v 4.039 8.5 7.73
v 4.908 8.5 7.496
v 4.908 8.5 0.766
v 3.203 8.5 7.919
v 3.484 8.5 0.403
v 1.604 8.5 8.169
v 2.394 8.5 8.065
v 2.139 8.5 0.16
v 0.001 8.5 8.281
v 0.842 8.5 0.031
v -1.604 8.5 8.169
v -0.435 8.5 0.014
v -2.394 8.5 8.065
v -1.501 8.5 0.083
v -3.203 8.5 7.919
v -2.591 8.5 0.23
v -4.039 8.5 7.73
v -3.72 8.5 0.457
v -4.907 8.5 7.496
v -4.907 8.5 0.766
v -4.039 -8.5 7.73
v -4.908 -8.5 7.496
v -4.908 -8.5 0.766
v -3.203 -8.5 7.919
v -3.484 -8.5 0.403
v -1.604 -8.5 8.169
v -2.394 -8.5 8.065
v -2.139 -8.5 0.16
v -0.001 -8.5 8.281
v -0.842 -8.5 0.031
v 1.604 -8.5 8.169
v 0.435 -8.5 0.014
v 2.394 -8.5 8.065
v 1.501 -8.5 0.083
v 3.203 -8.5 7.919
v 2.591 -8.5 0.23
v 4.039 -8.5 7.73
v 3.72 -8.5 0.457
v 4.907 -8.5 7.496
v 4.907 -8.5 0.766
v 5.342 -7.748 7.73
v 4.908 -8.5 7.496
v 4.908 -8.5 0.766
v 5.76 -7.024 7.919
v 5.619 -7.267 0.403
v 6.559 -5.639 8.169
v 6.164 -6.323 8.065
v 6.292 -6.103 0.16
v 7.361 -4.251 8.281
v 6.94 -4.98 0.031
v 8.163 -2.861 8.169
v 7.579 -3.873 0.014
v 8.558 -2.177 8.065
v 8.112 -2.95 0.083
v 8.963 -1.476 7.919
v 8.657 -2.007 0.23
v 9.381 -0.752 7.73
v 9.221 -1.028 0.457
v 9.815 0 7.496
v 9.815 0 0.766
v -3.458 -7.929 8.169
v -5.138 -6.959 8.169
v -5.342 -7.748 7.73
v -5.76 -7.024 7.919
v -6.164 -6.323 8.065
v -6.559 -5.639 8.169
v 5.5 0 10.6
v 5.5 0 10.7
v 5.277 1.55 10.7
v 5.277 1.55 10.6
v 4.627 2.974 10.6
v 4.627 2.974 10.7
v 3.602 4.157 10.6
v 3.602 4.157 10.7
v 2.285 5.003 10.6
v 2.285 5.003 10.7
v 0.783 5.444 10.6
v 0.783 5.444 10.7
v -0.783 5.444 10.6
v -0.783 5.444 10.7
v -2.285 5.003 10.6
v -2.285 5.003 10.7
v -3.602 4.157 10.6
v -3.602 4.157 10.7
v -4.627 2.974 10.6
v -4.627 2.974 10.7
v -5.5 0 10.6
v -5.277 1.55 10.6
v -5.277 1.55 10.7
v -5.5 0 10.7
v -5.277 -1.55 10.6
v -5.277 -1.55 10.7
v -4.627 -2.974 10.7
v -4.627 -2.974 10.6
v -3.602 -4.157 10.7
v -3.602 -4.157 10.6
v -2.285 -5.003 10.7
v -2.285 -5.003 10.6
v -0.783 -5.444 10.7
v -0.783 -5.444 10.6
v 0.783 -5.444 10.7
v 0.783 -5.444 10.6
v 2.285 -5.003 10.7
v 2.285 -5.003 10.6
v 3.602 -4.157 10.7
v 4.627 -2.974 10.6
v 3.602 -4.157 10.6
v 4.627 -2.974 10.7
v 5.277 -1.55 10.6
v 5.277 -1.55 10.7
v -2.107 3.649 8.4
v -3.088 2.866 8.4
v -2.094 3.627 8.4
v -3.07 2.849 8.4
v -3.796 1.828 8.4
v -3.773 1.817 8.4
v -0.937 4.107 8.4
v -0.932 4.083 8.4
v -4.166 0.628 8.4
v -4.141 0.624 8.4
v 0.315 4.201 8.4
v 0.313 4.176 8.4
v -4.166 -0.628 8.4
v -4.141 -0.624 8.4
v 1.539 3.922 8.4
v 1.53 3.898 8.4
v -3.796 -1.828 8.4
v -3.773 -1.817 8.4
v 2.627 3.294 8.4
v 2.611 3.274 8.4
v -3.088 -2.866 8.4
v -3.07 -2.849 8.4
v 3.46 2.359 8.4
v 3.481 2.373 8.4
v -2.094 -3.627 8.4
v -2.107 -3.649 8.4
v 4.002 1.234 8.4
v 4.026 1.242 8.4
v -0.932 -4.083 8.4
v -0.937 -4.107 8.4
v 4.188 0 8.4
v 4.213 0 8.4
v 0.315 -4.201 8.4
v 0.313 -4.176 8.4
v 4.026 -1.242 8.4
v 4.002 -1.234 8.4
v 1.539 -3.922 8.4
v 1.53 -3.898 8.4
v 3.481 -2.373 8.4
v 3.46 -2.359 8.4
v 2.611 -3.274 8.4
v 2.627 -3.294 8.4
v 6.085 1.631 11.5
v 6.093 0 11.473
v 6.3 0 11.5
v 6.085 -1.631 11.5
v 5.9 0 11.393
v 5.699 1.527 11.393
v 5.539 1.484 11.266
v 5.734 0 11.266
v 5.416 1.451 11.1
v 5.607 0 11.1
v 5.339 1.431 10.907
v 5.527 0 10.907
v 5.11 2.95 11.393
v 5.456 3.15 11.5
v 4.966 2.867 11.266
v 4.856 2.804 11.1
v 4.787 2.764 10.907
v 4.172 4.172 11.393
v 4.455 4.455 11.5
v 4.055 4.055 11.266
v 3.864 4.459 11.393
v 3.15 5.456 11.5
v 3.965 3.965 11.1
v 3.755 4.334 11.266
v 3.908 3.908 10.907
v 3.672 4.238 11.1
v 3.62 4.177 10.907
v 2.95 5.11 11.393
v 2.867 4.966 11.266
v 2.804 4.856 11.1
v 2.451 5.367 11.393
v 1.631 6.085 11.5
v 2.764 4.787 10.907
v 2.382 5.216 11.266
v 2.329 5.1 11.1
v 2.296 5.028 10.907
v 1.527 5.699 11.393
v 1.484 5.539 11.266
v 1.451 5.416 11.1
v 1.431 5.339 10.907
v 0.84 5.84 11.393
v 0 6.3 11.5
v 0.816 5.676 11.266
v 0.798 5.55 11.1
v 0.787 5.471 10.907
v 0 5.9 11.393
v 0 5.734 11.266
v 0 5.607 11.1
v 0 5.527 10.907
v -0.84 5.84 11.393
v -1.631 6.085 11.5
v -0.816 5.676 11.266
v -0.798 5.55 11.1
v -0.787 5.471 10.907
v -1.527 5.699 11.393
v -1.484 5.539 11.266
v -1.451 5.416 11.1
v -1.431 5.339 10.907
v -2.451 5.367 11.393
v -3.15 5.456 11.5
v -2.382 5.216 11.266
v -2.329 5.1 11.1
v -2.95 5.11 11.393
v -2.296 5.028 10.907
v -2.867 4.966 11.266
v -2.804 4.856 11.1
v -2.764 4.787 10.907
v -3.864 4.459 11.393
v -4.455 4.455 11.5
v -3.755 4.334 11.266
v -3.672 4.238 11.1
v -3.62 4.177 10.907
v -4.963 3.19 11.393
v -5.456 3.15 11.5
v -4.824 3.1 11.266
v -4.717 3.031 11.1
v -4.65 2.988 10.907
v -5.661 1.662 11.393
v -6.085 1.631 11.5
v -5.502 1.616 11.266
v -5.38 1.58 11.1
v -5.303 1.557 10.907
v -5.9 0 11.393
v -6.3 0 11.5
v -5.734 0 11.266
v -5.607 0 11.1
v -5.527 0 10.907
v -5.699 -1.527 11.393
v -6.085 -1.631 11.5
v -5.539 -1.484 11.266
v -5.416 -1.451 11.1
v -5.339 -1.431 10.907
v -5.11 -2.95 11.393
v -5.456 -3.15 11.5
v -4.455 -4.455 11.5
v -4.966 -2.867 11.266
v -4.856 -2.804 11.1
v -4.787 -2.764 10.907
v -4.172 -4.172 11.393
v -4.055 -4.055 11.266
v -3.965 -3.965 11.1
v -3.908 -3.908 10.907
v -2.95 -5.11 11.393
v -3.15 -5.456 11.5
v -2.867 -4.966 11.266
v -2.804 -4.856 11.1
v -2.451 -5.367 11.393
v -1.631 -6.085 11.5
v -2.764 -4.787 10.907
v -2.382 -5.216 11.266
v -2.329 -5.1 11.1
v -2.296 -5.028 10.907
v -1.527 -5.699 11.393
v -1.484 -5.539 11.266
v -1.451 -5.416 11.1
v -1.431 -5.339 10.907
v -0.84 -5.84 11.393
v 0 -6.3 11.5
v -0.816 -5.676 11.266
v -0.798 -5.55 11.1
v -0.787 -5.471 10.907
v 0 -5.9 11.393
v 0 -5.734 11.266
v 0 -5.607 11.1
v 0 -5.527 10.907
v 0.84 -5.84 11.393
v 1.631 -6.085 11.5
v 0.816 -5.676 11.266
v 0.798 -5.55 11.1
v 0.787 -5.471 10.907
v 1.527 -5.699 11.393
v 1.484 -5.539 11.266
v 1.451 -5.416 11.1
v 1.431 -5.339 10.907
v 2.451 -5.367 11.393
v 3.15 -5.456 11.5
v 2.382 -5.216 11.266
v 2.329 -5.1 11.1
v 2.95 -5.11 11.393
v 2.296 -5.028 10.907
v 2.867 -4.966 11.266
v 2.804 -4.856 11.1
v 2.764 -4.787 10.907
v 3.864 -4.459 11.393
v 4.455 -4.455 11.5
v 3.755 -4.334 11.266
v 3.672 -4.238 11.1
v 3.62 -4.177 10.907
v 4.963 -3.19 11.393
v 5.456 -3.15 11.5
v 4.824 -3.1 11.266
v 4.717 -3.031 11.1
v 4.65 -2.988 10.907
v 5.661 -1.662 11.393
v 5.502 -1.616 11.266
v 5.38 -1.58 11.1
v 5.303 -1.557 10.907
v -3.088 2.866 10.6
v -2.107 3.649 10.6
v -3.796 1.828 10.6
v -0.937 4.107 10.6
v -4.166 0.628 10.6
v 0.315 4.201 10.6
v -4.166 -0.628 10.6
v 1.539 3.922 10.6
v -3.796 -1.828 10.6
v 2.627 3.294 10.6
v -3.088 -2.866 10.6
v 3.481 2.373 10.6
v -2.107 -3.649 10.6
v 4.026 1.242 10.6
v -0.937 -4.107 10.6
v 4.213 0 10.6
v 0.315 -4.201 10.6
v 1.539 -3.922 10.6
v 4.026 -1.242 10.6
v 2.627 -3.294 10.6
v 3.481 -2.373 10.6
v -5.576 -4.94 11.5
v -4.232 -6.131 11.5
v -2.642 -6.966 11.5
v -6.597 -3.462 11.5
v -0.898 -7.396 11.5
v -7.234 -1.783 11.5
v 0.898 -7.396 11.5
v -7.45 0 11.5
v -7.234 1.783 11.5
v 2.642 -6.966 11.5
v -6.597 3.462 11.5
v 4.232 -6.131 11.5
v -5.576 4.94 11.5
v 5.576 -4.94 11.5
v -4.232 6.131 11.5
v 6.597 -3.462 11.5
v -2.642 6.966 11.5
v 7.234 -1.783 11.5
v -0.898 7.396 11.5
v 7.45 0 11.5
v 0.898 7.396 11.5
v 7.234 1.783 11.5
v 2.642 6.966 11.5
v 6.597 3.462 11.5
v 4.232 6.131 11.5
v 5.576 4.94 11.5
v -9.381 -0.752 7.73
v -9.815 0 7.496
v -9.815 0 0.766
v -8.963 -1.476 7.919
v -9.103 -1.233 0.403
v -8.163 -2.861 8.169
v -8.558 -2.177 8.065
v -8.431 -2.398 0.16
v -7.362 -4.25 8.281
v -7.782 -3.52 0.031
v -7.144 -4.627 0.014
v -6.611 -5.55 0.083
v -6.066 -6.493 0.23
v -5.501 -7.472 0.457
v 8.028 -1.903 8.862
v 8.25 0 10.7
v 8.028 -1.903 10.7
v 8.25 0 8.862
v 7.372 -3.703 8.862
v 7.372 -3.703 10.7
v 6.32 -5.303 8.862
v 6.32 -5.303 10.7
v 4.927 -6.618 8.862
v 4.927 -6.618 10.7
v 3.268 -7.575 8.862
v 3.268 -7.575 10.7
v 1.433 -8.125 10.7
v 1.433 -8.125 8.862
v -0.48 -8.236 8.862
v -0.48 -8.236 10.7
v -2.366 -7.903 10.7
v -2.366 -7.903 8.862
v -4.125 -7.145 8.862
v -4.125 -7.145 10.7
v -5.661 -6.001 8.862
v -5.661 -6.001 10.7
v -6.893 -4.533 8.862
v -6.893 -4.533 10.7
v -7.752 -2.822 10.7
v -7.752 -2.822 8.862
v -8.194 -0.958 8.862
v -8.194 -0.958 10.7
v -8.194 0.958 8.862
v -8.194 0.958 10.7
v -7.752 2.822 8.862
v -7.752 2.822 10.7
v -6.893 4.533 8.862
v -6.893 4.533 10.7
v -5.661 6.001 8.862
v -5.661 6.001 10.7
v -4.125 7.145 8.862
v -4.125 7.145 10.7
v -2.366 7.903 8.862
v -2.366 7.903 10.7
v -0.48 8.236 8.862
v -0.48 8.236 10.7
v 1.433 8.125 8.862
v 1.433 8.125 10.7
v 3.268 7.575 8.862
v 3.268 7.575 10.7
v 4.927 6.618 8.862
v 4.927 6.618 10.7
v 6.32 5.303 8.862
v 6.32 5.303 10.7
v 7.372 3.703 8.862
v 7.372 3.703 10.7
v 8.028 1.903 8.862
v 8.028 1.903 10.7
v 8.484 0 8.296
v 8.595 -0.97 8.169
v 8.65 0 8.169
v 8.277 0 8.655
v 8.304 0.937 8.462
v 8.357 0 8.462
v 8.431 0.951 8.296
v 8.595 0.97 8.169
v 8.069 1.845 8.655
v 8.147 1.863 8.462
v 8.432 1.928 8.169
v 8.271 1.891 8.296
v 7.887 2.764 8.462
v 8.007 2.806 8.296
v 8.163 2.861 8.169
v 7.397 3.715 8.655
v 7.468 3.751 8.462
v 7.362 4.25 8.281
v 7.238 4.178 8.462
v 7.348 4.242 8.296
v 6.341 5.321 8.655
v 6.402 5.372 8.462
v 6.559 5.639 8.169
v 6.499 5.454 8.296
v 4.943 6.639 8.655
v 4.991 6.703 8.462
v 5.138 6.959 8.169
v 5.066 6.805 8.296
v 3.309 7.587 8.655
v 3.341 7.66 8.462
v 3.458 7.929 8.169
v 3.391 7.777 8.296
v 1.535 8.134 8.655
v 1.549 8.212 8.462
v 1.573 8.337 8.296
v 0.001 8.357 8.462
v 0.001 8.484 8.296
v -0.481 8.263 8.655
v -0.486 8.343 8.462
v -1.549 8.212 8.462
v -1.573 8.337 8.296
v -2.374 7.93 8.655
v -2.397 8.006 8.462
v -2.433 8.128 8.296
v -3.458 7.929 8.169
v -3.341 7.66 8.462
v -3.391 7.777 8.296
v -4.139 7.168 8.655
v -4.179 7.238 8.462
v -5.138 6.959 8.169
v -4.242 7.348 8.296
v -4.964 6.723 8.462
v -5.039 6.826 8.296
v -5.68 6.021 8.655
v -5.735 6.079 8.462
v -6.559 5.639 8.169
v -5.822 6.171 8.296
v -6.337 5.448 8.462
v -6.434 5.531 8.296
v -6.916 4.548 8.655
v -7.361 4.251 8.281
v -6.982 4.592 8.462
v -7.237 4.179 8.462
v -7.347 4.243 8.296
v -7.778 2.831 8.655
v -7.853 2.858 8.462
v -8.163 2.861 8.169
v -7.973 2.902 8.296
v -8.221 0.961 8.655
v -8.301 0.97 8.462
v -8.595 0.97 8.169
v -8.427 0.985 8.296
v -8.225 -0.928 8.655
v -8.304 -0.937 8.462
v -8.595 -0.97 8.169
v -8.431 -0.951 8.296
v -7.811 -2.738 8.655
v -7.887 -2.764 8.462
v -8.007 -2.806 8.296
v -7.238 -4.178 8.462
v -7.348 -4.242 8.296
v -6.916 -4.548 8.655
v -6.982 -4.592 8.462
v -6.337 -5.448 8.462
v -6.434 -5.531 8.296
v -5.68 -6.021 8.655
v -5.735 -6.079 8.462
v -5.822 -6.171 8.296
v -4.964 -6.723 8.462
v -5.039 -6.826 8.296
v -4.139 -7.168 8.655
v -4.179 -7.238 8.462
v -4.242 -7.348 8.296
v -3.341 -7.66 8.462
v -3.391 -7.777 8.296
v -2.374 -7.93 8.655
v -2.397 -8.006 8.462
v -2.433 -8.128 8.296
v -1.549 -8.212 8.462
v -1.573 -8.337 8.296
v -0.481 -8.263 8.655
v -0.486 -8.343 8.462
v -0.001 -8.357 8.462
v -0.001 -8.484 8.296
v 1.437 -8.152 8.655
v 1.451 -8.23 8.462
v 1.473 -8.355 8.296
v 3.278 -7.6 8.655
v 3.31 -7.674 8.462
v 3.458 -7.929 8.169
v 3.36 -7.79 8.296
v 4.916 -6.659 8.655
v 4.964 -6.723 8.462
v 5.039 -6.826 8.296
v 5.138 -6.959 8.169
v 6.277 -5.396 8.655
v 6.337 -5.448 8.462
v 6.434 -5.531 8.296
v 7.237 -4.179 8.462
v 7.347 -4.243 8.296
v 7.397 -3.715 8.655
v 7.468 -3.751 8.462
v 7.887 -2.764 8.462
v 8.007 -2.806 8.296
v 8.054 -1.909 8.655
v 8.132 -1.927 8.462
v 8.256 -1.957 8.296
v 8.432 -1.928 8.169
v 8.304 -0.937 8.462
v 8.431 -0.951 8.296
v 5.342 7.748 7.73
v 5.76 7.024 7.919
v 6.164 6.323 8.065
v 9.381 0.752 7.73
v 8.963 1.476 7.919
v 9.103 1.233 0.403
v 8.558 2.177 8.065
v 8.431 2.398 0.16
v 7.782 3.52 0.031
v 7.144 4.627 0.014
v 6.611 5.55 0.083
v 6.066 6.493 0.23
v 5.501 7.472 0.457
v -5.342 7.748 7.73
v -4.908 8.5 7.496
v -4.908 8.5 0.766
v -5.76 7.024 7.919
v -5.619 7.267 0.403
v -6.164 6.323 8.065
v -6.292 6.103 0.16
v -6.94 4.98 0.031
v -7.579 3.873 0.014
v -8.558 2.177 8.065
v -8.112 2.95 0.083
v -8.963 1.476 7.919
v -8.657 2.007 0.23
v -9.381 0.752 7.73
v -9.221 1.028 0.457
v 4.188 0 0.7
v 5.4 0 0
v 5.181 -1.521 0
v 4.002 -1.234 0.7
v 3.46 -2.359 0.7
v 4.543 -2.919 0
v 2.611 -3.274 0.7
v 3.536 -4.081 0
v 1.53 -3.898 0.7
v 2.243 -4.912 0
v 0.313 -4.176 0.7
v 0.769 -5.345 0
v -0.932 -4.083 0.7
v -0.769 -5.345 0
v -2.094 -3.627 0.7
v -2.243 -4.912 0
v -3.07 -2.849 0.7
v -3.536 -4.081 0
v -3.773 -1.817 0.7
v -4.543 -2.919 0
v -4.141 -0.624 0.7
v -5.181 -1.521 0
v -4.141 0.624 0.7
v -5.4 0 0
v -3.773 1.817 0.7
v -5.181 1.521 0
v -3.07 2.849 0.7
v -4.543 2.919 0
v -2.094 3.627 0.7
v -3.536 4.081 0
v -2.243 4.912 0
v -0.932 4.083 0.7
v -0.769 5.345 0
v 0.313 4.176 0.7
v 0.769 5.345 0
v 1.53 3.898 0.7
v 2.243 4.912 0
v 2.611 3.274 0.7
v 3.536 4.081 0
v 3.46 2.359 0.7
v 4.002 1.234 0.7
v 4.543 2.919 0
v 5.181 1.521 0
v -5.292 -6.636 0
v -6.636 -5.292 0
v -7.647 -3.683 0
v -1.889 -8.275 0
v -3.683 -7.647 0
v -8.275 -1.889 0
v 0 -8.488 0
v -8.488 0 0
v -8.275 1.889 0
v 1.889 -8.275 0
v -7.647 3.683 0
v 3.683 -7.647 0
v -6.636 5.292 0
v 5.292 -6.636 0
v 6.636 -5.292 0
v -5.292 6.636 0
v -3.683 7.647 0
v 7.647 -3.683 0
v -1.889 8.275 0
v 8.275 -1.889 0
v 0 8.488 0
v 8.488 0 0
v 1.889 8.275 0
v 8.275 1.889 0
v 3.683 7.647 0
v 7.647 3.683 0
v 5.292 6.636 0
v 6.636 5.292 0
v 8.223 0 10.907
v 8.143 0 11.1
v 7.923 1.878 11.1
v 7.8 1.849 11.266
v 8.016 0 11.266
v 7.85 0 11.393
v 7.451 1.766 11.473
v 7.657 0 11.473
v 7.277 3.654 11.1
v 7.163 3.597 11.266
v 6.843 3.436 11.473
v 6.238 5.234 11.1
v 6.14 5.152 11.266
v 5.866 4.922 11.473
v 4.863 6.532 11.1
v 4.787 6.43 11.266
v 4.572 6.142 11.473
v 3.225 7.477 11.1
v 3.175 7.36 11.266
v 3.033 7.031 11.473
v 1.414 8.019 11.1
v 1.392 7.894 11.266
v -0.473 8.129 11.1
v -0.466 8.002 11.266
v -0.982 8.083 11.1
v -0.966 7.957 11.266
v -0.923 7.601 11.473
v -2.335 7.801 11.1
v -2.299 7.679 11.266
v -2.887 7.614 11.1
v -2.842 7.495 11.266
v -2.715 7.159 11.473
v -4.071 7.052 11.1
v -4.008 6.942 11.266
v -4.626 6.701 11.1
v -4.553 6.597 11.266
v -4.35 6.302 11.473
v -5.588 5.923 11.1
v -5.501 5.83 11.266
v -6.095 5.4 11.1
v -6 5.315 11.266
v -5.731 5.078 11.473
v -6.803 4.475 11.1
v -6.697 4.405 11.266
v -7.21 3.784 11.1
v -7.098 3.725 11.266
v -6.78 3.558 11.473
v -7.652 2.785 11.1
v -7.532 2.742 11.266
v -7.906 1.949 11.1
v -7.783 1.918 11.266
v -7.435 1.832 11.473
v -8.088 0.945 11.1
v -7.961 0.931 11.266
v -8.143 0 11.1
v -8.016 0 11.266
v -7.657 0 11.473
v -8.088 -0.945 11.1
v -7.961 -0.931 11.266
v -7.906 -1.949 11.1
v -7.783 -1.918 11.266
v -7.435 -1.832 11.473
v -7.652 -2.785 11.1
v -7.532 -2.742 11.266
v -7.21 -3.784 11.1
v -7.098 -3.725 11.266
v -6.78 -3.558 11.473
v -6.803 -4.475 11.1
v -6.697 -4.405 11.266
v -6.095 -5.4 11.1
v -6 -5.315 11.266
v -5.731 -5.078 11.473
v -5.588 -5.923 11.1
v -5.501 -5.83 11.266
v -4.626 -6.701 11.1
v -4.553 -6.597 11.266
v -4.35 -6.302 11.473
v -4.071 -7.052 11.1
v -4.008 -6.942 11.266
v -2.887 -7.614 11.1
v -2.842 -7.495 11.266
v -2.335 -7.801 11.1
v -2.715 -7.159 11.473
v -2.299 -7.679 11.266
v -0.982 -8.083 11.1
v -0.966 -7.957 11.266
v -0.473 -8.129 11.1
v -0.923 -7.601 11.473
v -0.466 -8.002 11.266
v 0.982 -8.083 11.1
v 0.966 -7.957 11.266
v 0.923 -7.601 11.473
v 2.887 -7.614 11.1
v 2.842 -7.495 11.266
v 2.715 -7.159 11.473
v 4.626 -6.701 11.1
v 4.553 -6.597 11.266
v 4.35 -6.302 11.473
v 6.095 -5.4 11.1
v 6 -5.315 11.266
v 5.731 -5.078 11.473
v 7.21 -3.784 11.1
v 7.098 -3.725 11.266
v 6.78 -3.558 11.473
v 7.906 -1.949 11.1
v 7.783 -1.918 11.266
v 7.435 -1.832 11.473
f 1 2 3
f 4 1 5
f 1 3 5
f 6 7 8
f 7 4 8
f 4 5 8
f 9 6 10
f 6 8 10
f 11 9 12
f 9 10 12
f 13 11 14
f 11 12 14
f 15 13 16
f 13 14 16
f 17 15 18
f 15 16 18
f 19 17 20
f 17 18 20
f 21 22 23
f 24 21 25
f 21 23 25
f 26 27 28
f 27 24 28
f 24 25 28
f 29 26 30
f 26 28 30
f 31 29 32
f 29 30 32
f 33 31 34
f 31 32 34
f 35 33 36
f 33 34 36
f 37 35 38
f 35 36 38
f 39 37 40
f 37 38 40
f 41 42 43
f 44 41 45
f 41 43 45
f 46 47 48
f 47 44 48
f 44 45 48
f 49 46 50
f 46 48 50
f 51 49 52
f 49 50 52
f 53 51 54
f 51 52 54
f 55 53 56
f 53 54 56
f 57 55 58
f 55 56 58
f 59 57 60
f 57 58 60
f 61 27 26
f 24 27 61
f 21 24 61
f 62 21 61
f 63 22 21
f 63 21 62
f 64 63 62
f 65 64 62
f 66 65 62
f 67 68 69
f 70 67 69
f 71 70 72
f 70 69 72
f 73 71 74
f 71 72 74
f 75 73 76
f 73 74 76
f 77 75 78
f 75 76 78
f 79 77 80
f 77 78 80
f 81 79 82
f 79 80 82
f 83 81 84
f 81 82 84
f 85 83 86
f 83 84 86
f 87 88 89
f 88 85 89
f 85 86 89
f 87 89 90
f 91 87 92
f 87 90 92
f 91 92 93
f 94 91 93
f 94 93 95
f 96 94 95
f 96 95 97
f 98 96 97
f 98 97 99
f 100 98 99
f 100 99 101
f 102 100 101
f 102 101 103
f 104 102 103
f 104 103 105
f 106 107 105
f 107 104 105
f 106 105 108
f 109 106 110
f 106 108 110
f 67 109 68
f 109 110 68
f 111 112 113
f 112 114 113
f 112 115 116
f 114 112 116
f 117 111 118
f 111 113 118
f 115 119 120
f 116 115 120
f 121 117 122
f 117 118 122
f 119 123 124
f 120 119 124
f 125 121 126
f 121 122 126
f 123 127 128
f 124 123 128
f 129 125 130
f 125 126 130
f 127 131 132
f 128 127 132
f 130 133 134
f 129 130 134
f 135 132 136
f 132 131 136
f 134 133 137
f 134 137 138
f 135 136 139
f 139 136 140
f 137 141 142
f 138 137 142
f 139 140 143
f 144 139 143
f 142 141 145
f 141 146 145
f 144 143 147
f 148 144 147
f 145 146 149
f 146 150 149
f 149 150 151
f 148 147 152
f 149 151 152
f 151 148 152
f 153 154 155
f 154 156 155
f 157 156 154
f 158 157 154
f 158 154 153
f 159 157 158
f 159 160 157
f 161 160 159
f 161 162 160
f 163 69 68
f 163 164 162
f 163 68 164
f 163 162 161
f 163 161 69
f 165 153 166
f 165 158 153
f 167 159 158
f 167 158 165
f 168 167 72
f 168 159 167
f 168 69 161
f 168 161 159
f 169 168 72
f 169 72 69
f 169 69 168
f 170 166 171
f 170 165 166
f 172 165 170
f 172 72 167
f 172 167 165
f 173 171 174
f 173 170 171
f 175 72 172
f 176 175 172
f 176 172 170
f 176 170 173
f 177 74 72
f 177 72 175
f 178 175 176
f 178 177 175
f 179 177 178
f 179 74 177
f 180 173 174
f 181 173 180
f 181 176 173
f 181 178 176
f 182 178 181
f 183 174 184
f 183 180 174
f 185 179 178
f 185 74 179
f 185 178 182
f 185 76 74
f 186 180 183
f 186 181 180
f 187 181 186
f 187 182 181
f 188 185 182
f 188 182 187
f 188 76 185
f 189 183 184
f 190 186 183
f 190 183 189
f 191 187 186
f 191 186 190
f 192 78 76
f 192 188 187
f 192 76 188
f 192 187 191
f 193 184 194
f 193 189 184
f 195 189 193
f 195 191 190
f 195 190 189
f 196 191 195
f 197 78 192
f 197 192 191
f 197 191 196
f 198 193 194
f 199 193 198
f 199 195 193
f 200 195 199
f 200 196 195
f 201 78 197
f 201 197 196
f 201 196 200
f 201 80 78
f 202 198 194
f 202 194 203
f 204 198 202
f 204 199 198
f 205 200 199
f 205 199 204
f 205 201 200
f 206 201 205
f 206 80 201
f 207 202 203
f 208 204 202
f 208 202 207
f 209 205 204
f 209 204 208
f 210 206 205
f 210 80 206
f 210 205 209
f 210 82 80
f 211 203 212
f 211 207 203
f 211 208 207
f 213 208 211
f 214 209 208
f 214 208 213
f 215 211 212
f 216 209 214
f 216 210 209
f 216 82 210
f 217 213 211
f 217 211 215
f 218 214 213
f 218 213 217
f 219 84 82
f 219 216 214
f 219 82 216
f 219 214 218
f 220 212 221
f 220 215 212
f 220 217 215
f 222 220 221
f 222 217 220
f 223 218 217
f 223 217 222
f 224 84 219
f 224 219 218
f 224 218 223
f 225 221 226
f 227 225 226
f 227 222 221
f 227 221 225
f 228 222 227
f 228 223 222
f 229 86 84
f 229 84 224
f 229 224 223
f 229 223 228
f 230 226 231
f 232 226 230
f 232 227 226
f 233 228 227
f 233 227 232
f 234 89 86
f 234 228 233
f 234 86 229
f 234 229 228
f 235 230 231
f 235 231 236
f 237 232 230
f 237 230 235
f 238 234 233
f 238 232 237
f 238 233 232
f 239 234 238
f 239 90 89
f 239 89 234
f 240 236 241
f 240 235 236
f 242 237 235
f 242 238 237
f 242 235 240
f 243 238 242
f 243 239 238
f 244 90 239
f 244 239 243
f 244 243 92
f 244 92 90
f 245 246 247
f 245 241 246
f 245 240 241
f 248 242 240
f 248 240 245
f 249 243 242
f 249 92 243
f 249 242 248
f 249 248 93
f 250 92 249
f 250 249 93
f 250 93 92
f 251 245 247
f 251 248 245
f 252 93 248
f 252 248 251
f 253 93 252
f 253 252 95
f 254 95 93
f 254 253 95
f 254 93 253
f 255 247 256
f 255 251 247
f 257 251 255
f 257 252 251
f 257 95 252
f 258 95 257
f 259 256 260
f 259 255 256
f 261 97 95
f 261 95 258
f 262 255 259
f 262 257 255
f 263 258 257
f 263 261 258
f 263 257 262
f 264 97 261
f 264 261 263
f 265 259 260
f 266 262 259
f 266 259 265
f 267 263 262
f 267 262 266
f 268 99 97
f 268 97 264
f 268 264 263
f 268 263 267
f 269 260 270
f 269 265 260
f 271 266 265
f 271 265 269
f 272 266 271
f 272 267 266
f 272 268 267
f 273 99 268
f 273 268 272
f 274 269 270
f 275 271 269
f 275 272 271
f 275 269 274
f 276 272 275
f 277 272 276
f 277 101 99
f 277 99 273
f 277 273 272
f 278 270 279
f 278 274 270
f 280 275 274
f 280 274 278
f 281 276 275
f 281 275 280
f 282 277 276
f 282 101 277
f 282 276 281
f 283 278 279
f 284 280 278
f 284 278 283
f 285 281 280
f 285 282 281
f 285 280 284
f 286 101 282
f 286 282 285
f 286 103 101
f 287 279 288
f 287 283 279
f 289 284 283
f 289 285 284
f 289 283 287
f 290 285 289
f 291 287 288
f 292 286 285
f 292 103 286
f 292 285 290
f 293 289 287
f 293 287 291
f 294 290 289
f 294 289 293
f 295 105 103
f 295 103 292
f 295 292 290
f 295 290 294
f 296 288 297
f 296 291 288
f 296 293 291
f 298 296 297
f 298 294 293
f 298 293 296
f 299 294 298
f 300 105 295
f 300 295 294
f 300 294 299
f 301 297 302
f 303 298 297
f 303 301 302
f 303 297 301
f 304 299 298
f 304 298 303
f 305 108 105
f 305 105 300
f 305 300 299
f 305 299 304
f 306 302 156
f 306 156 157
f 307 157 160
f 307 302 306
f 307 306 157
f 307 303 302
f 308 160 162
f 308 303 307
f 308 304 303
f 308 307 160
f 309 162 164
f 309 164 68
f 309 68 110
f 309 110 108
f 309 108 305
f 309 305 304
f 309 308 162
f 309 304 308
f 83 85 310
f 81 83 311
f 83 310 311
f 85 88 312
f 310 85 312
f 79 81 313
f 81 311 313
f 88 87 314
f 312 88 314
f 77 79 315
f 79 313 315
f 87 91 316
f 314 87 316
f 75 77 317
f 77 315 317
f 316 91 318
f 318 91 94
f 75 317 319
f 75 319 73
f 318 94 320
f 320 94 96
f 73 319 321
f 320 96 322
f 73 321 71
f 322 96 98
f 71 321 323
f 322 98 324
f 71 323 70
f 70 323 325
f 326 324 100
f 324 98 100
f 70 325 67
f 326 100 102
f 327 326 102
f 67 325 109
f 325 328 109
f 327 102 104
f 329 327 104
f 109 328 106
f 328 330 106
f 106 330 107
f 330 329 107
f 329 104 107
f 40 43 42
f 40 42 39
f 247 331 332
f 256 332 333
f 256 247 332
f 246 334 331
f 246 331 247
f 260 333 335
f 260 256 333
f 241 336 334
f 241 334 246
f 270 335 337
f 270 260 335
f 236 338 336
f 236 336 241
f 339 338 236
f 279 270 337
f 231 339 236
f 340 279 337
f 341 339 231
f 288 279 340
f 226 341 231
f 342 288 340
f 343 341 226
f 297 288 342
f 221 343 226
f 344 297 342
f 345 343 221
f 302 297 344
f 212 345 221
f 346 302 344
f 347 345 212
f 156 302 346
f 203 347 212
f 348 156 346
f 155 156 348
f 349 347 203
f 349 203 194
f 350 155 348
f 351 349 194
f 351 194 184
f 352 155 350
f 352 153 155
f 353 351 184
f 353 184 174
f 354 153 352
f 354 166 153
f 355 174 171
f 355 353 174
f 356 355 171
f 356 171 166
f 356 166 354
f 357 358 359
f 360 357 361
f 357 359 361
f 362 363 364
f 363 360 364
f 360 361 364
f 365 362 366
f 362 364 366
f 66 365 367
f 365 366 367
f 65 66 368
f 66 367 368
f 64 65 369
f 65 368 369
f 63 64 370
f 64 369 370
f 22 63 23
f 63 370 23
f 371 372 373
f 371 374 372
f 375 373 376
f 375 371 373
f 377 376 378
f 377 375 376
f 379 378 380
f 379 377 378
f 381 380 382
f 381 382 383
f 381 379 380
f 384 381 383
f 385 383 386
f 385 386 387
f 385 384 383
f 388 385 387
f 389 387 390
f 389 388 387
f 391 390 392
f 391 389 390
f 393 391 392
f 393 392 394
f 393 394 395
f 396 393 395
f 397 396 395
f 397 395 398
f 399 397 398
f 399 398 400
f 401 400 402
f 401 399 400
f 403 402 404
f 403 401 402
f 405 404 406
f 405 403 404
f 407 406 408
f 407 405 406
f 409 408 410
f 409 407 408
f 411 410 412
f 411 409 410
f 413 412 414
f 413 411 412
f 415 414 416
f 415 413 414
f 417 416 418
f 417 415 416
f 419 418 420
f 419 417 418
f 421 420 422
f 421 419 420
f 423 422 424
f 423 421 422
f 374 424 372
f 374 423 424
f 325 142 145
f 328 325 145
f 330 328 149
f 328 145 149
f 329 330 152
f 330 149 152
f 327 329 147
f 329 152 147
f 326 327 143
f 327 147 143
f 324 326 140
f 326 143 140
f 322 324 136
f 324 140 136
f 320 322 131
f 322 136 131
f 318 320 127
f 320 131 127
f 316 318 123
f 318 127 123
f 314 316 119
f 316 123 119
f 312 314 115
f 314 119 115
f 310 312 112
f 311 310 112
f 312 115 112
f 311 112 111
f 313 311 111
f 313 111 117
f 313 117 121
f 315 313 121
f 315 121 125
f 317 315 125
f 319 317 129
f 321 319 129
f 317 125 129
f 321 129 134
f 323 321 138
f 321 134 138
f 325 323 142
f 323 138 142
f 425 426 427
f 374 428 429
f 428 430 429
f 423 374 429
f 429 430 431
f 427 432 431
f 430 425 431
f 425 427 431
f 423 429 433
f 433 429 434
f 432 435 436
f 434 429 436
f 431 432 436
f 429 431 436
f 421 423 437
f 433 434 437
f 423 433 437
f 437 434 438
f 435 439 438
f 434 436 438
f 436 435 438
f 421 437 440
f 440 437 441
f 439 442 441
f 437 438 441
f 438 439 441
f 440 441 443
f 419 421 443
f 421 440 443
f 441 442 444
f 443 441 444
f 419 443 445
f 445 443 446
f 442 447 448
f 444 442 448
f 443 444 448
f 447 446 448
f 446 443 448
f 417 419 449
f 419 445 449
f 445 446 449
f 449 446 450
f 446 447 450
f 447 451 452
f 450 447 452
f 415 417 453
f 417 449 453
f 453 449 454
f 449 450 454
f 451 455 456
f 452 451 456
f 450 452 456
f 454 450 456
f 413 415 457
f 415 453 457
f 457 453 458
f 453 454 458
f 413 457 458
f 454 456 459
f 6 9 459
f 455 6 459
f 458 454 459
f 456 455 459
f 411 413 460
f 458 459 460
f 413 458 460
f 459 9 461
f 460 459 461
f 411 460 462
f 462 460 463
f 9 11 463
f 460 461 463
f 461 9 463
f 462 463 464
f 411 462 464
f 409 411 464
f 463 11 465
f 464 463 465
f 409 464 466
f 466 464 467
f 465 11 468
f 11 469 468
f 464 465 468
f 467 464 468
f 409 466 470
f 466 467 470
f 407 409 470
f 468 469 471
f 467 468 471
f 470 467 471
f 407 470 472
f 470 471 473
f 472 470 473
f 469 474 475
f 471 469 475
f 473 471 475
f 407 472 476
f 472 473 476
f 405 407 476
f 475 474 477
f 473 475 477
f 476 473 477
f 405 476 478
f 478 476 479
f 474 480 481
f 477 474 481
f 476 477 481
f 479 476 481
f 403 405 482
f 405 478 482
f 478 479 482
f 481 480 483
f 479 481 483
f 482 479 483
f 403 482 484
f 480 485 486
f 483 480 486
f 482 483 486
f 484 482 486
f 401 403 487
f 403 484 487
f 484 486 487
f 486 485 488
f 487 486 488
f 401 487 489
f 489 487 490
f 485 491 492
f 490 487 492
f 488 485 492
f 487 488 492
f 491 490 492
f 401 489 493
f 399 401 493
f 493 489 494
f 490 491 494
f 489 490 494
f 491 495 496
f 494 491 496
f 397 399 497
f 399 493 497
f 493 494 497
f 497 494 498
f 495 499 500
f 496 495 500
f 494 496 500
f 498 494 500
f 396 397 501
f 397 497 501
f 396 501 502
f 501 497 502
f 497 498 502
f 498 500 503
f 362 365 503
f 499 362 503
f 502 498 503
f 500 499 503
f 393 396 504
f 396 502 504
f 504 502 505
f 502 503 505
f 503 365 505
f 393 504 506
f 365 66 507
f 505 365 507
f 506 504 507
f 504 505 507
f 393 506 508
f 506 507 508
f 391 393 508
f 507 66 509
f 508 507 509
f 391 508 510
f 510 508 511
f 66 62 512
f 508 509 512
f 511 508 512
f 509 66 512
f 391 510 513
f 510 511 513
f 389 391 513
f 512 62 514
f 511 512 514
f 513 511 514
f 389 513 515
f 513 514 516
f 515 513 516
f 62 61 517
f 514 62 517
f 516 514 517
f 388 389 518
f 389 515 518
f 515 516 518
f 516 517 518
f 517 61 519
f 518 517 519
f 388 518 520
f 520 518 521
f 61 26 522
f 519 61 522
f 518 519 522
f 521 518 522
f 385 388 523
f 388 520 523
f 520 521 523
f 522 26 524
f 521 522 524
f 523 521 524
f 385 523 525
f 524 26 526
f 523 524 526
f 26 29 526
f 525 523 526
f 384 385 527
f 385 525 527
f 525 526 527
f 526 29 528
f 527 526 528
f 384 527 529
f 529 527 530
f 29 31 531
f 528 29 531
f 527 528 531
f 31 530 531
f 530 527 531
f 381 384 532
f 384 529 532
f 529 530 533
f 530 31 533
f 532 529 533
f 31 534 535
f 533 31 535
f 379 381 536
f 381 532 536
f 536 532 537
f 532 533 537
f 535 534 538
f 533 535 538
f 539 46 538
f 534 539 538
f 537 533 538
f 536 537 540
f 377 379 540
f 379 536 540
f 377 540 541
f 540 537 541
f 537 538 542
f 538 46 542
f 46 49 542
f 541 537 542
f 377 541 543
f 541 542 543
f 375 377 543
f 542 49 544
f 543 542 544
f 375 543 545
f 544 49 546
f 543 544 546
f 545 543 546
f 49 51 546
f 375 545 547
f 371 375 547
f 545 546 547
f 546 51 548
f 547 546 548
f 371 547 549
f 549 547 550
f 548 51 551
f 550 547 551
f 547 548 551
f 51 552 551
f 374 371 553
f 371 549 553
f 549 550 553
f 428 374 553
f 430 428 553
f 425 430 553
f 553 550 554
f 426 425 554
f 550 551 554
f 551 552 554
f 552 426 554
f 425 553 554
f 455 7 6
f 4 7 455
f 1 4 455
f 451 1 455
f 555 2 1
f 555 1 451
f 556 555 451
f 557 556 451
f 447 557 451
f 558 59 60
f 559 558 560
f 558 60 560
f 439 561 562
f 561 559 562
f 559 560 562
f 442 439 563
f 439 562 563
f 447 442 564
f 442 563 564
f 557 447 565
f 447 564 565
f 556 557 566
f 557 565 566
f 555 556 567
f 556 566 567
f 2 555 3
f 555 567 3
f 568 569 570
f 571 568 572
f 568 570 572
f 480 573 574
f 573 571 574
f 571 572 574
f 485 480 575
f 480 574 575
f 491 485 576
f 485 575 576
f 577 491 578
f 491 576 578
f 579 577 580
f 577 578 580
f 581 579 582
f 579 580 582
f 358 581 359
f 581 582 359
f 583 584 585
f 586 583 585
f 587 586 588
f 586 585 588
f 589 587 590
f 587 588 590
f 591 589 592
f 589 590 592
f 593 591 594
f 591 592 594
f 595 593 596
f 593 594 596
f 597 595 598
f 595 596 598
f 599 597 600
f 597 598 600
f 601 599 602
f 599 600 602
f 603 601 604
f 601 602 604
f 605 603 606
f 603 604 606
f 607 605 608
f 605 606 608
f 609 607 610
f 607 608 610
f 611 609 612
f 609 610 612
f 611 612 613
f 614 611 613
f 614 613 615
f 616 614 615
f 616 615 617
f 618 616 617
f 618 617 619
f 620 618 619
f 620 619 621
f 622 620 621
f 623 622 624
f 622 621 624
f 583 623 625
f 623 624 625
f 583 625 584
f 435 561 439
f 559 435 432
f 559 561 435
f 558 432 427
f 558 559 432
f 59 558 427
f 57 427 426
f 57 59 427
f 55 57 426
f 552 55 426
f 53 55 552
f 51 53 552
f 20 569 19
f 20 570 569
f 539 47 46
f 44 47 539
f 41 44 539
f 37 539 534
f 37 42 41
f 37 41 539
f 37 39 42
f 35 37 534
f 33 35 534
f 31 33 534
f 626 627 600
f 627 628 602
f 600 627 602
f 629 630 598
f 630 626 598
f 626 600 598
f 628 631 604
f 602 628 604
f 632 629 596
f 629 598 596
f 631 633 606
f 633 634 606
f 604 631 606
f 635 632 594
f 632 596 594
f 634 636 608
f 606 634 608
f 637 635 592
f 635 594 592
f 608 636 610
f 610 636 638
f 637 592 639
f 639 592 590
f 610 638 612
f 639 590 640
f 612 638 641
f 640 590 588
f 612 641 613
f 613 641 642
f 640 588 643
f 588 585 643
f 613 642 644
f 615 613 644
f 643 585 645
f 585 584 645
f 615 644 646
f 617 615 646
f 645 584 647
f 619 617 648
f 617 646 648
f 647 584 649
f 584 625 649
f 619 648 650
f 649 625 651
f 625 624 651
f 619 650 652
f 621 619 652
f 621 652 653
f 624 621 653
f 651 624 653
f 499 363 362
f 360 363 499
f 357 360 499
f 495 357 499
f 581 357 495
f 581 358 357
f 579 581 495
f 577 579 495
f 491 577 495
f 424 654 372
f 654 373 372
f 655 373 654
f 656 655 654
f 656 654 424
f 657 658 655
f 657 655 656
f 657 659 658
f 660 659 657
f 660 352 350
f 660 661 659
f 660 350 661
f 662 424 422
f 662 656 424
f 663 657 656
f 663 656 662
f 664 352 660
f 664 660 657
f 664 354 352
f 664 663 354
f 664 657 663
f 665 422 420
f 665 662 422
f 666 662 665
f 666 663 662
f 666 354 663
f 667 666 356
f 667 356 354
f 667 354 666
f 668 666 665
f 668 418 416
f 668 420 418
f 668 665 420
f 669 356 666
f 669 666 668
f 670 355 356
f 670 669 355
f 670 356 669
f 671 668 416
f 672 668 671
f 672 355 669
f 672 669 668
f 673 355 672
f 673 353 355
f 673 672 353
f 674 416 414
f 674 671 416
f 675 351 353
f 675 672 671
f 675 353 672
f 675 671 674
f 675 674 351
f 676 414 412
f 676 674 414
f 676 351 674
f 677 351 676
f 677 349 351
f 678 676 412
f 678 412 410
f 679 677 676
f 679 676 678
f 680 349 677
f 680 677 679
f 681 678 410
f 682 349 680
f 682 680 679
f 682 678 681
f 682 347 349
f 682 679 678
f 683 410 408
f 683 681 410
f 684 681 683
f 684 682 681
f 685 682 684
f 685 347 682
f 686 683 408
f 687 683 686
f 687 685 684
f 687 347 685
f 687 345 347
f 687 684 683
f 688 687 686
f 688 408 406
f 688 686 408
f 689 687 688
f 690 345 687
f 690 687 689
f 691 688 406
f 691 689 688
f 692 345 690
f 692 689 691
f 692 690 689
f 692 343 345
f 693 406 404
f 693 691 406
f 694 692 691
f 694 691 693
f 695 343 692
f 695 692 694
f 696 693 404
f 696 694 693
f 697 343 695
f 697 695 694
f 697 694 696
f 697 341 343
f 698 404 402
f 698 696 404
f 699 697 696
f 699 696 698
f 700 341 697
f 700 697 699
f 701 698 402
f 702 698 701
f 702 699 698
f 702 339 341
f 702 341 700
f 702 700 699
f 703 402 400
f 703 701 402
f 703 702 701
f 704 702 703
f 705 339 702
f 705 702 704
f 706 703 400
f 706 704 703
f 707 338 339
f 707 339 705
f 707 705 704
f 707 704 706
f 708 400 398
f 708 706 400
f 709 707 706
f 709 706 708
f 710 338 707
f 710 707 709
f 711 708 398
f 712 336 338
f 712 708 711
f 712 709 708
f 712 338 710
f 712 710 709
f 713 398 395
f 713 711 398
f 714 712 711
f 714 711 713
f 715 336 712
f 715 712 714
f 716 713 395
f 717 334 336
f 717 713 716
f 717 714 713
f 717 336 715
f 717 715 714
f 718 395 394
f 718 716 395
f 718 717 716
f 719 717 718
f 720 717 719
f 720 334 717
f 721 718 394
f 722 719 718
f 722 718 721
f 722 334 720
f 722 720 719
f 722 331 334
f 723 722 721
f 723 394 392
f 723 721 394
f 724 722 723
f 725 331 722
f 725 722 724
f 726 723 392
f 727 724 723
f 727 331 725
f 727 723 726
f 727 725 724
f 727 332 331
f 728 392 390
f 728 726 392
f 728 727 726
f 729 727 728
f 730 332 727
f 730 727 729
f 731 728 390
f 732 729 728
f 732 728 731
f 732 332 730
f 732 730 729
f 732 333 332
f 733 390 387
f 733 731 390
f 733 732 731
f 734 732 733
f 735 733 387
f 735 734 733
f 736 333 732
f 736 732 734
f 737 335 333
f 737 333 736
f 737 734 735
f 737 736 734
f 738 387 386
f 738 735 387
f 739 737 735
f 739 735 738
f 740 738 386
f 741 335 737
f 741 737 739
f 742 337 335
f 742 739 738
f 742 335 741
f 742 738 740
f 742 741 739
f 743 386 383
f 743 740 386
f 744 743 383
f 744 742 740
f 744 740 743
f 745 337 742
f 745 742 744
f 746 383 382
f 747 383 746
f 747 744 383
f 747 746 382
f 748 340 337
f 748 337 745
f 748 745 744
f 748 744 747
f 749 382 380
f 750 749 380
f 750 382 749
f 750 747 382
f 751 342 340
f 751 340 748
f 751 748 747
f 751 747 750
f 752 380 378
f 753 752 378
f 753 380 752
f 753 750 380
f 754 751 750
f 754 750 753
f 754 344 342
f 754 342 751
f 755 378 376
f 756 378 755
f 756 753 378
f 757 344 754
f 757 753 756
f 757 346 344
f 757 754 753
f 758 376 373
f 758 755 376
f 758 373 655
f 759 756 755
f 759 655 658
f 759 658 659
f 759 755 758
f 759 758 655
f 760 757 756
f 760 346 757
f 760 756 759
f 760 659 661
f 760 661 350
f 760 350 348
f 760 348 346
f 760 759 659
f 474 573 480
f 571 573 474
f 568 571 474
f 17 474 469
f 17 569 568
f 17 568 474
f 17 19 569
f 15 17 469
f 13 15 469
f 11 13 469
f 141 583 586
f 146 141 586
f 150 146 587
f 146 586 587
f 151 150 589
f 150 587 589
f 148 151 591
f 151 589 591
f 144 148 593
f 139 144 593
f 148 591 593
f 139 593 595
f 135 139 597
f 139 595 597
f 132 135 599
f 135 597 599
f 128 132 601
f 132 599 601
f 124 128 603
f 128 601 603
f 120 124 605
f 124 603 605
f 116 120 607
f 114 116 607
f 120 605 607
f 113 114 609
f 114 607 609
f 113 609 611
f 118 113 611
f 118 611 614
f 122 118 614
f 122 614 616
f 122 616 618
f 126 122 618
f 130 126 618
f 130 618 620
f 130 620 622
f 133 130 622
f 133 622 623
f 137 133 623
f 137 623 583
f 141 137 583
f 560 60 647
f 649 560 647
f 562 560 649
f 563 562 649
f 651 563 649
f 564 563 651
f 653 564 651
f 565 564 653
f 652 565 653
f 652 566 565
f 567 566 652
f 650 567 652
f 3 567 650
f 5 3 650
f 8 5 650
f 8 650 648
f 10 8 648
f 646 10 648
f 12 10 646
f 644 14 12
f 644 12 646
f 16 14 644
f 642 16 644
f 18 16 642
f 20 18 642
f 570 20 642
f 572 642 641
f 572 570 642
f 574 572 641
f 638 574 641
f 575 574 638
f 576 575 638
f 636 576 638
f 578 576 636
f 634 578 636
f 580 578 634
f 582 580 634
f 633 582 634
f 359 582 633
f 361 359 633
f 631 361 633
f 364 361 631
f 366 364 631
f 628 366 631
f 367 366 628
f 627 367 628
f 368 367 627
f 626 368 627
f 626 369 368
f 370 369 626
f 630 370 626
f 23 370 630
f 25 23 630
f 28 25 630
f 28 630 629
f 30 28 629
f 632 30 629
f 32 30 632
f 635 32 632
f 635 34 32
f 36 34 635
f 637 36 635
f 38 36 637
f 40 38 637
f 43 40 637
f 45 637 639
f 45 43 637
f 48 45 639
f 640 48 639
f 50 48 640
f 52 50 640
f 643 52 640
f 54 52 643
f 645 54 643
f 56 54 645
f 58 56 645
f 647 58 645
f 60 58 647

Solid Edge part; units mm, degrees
sketch "Sketch1" plane through (0, 0, 0) normal (0, 0, 1) x (1, 0, 0)
  circle A0 centre (0, 0) radius 4.188
  circle A1 centre (0, 0) radius 9.815
  dimension "D1" = 8.5
  dimension "D2" = 8.376
extrude "Protrusion1" add sketch "Sketch1" along normal blind 11.5
sketch "Sketch2" plane through (0, 0, 0) normal (0, 0, 1) x (1, 0, 0)
  line L0 (9.815, 0) -> (4.9075, 8.5)
  arc A0 (4.9075, 8.5) -> (9.815, 0) centre (0, 0) cw
  dimension "D1" = 8.5
extrude "ExtrudedCutout_1" cut sketch "Sketch2" along normal blind 11.5
pattern_circular "Pattern1" count 6 over 360 about axis through (0, 0, 0) along (0, 0, -1) of "ExtrudedCutout_1"
cosmetic_thread "Thread_1" size "M10" thread depth 8.4
sketch "Sketch3" plane through (0, 0, 0) normal (0, -1, 0) x (1, 0, 0)
  line L0 (9.8153, 0.7666) -> (9.8153, 0)
  line L1 (9.8153, 0) -> (8.4875, 0)
  line L2 (8.4875, 0) -> (9.8153, 0.7666)
  line L3 (8.25, 11.5) -> (8.25, 8.8619)
  arc A0 (8.25, 8.8619) -> (8.65, 8.1691) centre (9.05, 8.8619) ccw
  line L4 (8.65, 8.1691) -> (9.8153, 7.4963)
  line L5 (9.8153, 7.4963) -> (9.8153, 11.5)
  line L6 (9.8153, 11.5) -> (8.25, 11.5)
  dimension "D1" = 11.5
  dimension "D2" = 8.4875
  dimension "D3" = 9.8153
  dimension "D4" = 8.25
  dimension "D5" = 9.8153
  dimension "D6" = 8.4
  dimension "D7" = 0.8
revolve "RevolvedCutout_1" cut sketch "Sketch3" angle 360 about axis through (0, 0, 11.9) along (0, 0, -1)
sketch "Sketch4" plane through (0, 0, 0) normal (0, -1, 0) x (1, 0, 0)
  line L0 (4.188, 11.5) -> (4.188, 8.4)
  line L1 (5.5, 11.5) -> (4.188, 11.5)
  line L2 (5.5, 10.6) -> (5.5, 11.5)
  line L3 (4.213, 10.6) -> (5.5, 10.6)
  line L4 (4.213, 10.6) -> (4.213, 8.4)
  line L5 (4.213, 8.4) -> (4.188, 8.4)
  dimension "D1" = 8.4
  dimension "D2" = 11.5
  dimension "D3" = 0.9
  dimension "D4" = 4.188
  dimension "D5" = 0.025
  dimension "D6" = 5.5
revolve "RevolvedCutout_2" cut sketch "Sketch4" angle 360 about axis through (0, 0, 8.4) along (0, 0, -1)
fillet "Round_1" radius 0.8 2 edges at (-8.25, 0, 11.5) (-5.5, 0, 11.5)
chamfer "Chamfer_1" distance 1.212 angle 30 1 edges at (-4.188, 0, 0) measured on face at (-5.8281, -5.4886, 0)
properties material "Steel"
